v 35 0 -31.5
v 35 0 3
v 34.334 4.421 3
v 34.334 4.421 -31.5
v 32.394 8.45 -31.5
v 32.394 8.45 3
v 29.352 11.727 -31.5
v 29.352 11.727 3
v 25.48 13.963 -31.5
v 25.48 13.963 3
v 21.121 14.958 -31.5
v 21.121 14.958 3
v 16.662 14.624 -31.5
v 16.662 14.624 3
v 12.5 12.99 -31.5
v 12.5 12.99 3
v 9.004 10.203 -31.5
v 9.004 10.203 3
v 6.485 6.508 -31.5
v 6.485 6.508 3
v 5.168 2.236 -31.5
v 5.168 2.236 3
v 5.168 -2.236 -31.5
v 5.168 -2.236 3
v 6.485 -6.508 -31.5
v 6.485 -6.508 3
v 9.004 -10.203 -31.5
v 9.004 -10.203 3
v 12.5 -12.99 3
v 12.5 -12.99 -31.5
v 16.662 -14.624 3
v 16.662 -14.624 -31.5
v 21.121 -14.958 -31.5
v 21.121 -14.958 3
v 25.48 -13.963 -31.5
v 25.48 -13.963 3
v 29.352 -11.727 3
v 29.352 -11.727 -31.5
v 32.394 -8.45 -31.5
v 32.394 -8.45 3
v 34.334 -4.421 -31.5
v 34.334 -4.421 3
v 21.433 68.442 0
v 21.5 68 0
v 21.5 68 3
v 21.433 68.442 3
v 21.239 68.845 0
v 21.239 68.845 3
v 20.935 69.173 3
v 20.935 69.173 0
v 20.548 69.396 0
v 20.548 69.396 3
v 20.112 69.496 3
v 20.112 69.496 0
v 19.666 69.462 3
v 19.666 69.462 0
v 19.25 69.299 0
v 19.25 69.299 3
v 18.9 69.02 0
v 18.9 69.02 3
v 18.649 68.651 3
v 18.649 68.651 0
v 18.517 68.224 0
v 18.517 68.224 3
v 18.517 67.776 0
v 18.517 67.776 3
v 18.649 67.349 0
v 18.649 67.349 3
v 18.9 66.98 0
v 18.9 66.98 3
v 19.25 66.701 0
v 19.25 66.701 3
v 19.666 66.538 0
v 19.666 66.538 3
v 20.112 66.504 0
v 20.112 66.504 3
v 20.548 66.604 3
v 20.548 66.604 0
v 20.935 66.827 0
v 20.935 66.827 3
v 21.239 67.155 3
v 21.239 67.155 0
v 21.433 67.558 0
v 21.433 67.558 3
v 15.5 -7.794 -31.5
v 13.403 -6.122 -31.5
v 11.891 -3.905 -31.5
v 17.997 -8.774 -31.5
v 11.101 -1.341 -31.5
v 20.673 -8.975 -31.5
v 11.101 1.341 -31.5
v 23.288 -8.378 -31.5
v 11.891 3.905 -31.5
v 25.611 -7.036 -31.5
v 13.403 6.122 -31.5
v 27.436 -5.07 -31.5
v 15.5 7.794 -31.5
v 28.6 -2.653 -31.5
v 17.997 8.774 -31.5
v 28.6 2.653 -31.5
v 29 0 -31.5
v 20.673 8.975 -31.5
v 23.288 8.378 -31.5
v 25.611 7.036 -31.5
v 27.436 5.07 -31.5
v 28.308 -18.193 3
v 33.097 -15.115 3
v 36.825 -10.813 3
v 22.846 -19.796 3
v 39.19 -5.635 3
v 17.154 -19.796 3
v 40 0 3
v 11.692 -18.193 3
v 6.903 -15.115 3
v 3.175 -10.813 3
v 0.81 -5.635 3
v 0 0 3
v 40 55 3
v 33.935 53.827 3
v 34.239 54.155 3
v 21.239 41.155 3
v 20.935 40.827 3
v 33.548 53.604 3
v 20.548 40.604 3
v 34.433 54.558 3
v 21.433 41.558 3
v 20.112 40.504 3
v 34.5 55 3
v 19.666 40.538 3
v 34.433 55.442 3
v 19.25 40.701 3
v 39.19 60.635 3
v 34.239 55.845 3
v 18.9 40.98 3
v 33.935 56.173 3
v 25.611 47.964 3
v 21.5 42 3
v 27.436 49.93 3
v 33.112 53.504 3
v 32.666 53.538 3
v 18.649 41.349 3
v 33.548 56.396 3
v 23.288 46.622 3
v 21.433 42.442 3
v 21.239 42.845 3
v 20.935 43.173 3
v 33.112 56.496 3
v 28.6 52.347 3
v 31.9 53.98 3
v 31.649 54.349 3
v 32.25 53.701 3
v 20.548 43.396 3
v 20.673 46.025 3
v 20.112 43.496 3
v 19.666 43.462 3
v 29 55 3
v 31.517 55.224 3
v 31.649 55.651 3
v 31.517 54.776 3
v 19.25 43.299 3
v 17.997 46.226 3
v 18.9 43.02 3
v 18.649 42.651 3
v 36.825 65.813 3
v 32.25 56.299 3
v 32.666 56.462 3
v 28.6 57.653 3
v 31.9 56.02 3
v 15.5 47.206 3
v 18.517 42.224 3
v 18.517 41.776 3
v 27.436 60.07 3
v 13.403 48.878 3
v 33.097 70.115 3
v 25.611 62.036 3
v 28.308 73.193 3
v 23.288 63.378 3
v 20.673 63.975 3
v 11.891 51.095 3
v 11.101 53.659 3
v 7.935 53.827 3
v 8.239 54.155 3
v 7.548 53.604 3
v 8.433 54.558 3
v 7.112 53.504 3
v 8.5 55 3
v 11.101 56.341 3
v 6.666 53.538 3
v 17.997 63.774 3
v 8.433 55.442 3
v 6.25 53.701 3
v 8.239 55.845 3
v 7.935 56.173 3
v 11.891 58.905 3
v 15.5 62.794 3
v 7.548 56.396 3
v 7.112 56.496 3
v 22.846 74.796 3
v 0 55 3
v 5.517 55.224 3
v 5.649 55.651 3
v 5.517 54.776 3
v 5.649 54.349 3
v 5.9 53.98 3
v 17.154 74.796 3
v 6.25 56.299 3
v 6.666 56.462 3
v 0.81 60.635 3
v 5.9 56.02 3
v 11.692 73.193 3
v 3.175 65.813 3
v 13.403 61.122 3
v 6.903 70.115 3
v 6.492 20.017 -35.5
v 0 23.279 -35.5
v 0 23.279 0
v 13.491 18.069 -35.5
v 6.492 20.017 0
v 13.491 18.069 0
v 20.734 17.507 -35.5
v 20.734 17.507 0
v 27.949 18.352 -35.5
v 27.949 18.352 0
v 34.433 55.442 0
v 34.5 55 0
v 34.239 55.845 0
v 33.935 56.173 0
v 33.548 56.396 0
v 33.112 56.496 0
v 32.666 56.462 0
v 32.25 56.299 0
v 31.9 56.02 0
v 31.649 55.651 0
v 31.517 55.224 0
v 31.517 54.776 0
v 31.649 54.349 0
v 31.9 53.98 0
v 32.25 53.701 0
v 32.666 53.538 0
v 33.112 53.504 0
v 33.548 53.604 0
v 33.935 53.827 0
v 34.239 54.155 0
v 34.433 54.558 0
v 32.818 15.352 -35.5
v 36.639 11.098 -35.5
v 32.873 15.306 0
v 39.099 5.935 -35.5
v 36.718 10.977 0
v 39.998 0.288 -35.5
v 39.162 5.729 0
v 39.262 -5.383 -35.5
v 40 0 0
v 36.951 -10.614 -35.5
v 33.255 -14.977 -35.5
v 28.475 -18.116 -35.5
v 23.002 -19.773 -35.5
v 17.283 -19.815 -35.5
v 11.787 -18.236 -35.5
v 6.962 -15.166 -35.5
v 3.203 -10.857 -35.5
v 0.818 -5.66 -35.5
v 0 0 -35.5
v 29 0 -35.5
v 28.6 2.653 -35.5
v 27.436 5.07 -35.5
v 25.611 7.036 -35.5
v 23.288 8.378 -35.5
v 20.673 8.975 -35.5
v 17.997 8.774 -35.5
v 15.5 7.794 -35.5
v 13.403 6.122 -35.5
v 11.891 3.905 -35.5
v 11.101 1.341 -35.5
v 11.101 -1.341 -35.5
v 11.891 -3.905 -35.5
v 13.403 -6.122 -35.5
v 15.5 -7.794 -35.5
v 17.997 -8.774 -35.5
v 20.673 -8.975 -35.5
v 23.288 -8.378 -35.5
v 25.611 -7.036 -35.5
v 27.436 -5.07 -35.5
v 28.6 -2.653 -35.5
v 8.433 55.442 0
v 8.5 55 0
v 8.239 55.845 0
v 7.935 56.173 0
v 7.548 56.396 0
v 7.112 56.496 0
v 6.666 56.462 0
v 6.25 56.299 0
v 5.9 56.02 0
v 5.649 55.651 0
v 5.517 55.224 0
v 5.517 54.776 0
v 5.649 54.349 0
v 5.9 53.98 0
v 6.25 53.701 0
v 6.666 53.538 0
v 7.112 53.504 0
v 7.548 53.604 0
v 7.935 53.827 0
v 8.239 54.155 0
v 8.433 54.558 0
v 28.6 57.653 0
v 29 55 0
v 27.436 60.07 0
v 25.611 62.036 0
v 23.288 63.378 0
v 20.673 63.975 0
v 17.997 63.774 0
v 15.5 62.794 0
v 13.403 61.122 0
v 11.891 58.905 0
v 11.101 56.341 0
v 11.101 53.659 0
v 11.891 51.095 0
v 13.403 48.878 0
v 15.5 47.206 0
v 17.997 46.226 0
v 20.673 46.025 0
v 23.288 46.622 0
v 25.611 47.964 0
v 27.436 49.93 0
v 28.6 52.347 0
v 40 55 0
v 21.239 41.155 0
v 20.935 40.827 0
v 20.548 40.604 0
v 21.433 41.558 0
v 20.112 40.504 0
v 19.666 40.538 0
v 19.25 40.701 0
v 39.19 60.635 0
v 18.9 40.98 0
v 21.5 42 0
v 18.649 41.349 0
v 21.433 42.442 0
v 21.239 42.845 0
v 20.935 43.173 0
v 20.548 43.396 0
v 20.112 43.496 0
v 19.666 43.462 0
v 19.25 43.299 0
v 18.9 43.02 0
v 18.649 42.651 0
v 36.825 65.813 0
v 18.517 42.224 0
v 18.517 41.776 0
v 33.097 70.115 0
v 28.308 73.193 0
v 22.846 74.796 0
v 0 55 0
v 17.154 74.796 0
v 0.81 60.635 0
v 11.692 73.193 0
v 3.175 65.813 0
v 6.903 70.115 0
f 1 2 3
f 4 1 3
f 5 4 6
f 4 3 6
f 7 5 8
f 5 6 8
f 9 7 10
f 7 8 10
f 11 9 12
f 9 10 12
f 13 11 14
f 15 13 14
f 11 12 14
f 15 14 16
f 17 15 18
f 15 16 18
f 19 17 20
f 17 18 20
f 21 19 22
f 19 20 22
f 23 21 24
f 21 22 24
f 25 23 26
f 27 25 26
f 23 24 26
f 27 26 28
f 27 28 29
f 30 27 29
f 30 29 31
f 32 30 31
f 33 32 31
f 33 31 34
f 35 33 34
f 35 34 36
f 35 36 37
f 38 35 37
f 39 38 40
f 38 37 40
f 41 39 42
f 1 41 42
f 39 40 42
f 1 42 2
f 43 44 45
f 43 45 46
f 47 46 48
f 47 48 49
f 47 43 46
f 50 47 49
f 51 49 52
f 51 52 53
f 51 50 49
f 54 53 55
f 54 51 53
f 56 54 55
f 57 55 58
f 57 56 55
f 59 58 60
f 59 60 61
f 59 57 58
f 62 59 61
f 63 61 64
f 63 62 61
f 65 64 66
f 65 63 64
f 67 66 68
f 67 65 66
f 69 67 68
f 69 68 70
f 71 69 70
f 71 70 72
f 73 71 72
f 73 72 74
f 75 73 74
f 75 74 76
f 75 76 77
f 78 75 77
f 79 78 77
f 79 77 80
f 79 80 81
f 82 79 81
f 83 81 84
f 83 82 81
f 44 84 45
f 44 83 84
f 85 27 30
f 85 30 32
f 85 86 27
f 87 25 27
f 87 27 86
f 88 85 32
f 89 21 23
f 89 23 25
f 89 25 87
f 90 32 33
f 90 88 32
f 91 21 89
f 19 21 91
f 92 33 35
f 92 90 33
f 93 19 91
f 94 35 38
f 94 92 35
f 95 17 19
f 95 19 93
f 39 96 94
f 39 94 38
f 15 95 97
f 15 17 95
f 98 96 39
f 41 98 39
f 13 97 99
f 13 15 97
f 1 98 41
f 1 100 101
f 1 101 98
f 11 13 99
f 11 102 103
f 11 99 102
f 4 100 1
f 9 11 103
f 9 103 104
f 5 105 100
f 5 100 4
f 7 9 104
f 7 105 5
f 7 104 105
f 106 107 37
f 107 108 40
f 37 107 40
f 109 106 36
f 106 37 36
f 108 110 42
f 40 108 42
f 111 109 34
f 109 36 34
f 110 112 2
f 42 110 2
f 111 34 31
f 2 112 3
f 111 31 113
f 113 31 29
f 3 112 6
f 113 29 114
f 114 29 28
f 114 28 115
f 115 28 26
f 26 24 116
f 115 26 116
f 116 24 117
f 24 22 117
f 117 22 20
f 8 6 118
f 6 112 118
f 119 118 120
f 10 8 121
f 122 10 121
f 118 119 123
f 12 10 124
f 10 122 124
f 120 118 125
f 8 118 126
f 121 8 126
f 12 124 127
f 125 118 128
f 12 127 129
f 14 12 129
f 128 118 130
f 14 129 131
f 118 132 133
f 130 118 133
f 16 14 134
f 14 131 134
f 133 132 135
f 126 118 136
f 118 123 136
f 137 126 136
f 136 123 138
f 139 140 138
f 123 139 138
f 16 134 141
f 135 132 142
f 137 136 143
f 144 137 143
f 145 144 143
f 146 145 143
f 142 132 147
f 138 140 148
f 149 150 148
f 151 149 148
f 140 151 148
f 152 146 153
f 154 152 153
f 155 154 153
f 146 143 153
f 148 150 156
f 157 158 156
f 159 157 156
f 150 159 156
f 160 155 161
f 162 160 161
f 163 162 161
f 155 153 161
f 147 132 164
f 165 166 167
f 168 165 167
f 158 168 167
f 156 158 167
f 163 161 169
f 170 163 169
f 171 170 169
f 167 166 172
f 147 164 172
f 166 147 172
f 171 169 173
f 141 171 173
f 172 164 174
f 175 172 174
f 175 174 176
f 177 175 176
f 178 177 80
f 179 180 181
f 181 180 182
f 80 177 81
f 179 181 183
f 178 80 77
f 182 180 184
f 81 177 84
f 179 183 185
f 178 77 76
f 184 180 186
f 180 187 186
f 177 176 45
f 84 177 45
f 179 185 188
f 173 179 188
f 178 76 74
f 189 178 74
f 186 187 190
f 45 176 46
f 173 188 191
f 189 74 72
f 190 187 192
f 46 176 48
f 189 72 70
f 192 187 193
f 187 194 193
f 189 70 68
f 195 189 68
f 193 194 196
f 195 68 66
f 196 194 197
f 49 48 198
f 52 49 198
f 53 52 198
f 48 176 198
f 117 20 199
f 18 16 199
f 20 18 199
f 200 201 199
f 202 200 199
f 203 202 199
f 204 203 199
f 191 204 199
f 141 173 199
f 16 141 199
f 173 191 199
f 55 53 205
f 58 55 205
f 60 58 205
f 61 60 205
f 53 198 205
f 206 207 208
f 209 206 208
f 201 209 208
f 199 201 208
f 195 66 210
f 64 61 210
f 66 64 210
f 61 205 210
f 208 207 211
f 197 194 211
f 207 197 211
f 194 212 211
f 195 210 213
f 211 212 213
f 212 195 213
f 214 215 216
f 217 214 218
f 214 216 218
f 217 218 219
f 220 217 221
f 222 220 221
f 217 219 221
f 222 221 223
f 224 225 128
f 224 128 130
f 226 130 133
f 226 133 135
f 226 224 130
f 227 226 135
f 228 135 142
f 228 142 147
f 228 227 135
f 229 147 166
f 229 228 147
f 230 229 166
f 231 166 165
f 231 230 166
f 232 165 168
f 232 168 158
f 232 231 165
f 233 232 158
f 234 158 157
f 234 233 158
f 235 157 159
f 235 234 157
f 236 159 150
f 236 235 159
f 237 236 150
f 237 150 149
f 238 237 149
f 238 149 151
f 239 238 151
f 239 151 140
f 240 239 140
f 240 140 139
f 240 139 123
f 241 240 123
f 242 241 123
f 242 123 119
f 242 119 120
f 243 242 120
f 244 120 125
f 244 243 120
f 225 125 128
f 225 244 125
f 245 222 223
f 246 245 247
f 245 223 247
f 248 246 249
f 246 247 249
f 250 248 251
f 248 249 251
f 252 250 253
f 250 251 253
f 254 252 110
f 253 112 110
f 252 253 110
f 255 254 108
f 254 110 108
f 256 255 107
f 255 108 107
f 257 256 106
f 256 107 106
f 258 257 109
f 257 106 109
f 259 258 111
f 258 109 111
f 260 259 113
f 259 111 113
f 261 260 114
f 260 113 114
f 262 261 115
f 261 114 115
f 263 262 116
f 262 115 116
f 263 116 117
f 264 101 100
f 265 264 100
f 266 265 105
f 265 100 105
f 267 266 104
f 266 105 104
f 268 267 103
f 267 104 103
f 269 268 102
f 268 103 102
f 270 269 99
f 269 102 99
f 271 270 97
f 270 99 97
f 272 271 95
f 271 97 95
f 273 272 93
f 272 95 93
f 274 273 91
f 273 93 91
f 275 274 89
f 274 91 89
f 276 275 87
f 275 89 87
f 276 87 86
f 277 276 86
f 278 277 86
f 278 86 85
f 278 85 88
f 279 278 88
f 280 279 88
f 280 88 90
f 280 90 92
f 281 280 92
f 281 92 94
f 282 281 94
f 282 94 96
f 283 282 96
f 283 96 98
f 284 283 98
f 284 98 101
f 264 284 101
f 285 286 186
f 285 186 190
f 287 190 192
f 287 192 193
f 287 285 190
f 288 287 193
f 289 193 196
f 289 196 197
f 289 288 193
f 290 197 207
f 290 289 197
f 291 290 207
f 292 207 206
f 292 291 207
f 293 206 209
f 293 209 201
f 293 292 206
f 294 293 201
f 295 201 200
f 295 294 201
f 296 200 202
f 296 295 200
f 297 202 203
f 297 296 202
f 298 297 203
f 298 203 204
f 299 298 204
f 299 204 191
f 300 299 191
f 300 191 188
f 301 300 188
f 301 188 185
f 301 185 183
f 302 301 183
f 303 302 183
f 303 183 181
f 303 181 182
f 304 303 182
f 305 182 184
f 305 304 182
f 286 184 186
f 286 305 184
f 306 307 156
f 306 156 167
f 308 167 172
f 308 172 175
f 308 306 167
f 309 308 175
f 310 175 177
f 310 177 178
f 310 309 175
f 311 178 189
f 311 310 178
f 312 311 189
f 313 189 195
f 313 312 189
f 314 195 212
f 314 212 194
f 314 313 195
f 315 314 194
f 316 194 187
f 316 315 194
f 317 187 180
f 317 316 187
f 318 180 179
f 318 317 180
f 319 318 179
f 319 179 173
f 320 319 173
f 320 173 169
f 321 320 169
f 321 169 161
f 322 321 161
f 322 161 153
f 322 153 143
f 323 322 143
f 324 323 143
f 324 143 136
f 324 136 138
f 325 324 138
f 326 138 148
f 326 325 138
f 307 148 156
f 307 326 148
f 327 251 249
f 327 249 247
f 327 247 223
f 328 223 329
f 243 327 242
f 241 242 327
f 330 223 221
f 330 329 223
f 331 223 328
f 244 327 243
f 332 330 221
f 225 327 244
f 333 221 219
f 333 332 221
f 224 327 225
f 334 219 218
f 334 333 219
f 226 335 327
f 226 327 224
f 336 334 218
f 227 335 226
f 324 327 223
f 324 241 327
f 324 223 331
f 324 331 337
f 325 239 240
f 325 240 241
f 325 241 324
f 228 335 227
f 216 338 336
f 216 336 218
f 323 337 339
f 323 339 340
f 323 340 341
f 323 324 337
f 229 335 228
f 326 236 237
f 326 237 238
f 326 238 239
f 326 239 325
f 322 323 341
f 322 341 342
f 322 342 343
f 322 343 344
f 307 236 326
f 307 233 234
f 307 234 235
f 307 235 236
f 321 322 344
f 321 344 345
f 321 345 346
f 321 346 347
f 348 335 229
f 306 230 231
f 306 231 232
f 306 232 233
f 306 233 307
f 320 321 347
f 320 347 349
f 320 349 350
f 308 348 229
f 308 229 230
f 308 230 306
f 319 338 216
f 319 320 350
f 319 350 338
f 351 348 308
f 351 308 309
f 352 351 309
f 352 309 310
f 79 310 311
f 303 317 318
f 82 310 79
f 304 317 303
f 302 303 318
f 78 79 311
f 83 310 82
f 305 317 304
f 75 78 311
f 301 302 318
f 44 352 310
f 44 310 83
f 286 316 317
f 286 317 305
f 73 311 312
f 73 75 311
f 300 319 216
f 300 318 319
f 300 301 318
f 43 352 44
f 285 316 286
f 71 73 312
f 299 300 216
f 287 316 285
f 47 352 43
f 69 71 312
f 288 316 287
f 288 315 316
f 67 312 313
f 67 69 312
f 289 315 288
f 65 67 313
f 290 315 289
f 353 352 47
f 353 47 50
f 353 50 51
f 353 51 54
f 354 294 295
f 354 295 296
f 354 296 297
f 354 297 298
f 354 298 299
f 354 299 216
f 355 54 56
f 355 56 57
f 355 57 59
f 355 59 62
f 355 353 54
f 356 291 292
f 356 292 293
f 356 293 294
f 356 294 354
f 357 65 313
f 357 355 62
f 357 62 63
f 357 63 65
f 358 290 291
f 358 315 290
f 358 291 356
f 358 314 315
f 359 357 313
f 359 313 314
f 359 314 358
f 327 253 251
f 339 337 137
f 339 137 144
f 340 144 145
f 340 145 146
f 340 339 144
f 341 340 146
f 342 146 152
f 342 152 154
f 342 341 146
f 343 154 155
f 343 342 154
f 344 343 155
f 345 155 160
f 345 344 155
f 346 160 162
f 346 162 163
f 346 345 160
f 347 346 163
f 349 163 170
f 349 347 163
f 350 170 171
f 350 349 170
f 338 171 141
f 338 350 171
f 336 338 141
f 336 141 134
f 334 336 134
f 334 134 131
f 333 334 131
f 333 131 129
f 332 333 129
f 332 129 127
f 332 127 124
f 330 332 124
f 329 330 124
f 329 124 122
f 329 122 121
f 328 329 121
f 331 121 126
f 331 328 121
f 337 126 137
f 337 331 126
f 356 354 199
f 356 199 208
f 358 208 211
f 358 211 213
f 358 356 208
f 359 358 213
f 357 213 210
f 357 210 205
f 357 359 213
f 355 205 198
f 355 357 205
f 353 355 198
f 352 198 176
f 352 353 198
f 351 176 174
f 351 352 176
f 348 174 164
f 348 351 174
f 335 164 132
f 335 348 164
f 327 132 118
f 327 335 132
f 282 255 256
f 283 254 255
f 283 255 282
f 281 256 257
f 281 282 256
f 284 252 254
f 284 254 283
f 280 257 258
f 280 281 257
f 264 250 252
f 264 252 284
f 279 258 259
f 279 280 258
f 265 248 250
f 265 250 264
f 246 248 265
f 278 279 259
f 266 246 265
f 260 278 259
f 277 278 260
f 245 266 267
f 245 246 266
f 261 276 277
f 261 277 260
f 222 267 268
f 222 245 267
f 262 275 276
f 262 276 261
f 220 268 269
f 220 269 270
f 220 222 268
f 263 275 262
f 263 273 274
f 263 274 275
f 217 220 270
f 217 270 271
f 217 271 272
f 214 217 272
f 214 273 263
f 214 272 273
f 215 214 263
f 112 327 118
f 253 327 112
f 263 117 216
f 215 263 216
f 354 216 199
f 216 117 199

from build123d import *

# Parameters (mm, degrees)
ESQUISSE1_R      = 9
ESQUISSE1_R_2    = 15
ESQUISSE1_R_3    = 1.5
EXTRUSION1_DEPTH = 3
ESQUISSE2_R      = 9
EXTRUSION2_DEPTH = 38.5
ESQUISSE3_R      = 15
EXTRUSION3_DEPTH = 34.5


with BuildPart() as part:
    # Esquisse1 → Extrusion1 (new body)
    with BuildSketch(Plane.XY):
        with BuildLine():
            Line((0, 0), (0, 55))
            ThreePointArc((0, 55), (20, 75), (40, 55))
            Line((40, 55), (40, 0))
            ThreePointArc((40, 0), (20, -20), (0, 0))
        make_face()
        with Locations((20, 55)):
            Circle(ESQUISSE1_R, mode=Mode.SUBTRACT)
        with Locations((20, 0)):
            Circle(ESQUISSE1_R_2, mode=Mode.SUBTRACT)
        with Locations((20, 68)):
            Circle(ESQUISSE1_R_3, mode=Mode.SUBTRACT)
        with Locations((20, 42)):
            Circle(ESQUISSE1_R_3, mode=Mode.SUBTRACT)
        with Locations((7, 55)):
            Circle(ESQUISSE1_R_3, mode=Mode.SUBTRACT)
        with Locations((33, 55)):
            Circle(ESQUISSE1_R_3, mode=Mode.SUBTRACT)
    extrude(amount=EXTRUSION1_DEPTH)

    # Esquisse2 → Extrusion2 (add)
    with BuildSketch(Plane.XY.offset(3)):
        with BuildLine():
            Line((0, 0), (0, 23.278556149))
            ThreePointArc((0, 23.278556149), (13.490708127, 18.069265925), (27.949470784, 18.352272727))
            ThreePointArc((27.949470784, 18.352272727), (30.977490249, -16.718095222), (0, 0))
        make_face()
        with Locations((20, 0)):
            Circle(ESQUISSE2_R, mode=Mode.SUBTRACT)
    extrude(amount=-EXTRUSION2_DEPTH)

    # Esquisse3 → Extrusion3 (cut)
    with BuildSketch(Plane.XY.offset(3)):
        with Locations((20, 0)):
            Circle(ESQUISSE3_R)
    extrude(amount=-EXTRUSION3_DEPTH, mode=Mode.SUBTRACT)


solid = part.part
